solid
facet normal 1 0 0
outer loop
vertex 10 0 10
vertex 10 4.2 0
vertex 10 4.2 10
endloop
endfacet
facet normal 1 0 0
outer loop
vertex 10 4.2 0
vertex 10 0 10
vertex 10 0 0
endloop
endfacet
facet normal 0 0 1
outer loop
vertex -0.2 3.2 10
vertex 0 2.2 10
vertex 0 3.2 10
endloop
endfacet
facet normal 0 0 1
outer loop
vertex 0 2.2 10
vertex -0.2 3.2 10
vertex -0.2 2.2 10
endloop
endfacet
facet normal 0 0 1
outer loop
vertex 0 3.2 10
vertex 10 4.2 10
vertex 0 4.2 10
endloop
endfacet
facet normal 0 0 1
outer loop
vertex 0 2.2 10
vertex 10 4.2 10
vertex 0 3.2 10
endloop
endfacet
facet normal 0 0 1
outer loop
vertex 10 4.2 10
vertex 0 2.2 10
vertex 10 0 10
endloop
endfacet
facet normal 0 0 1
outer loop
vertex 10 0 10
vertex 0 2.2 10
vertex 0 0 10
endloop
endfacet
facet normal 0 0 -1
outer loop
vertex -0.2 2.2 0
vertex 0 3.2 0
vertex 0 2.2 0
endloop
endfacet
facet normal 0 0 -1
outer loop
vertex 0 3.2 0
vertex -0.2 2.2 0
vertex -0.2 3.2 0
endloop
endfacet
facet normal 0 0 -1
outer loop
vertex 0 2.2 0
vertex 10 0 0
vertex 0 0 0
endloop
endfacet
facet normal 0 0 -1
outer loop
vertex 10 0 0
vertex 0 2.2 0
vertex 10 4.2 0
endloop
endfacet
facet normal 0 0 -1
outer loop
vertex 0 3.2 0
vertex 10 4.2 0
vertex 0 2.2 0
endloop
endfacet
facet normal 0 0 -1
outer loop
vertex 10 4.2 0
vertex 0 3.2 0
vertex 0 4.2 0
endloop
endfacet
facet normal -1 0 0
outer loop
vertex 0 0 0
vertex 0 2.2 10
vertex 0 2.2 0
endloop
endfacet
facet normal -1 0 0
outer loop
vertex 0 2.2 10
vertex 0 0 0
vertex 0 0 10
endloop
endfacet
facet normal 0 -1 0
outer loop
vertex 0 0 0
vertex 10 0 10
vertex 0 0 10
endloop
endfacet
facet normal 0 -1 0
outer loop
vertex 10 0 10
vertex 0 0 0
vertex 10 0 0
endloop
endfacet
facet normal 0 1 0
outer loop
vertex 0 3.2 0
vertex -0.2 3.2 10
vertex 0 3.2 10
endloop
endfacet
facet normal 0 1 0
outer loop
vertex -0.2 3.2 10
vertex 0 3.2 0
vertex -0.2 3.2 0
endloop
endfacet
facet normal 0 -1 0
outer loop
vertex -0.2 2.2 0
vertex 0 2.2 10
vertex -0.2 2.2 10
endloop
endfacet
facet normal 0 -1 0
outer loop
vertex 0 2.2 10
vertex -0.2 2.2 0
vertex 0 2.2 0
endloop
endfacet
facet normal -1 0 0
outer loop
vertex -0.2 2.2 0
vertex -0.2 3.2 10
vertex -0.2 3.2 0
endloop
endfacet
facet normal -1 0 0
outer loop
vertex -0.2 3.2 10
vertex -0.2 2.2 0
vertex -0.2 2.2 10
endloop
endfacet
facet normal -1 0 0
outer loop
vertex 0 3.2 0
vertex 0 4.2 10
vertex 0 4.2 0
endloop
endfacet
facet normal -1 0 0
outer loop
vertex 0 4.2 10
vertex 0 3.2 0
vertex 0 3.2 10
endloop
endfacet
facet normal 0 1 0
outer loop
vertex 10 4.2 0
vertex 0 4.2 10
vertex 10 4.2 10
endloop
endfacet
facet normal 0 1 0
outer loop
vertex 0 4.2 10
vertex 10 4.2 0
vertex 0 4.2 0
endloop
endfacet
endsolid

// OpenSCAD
w = 10;
dw = 1;
ew = 0.2;
h = 10;
l0 = 0.2;
l1 = 1;

color([1,1,1])cube([w,l0,h]);
color([1,1,0.8])translate([dw,l0,0])cube([w-dw,l1*3,h]);
color([0.6,0.6,0.6])translate([0,l0,0])cube([dw,l1,h]);
color([1,0.6,0.6])translate([0,l0+l1,0])cube([dw,l1,h]);
color([0.6,1,0.6])translate([-ew,l0+l1*2,0])cube([dw+ew,l1,h]);
color([0.2,0.2,0.2])translate([0,l0+l1*3,0])cube([w,l1,h]);
